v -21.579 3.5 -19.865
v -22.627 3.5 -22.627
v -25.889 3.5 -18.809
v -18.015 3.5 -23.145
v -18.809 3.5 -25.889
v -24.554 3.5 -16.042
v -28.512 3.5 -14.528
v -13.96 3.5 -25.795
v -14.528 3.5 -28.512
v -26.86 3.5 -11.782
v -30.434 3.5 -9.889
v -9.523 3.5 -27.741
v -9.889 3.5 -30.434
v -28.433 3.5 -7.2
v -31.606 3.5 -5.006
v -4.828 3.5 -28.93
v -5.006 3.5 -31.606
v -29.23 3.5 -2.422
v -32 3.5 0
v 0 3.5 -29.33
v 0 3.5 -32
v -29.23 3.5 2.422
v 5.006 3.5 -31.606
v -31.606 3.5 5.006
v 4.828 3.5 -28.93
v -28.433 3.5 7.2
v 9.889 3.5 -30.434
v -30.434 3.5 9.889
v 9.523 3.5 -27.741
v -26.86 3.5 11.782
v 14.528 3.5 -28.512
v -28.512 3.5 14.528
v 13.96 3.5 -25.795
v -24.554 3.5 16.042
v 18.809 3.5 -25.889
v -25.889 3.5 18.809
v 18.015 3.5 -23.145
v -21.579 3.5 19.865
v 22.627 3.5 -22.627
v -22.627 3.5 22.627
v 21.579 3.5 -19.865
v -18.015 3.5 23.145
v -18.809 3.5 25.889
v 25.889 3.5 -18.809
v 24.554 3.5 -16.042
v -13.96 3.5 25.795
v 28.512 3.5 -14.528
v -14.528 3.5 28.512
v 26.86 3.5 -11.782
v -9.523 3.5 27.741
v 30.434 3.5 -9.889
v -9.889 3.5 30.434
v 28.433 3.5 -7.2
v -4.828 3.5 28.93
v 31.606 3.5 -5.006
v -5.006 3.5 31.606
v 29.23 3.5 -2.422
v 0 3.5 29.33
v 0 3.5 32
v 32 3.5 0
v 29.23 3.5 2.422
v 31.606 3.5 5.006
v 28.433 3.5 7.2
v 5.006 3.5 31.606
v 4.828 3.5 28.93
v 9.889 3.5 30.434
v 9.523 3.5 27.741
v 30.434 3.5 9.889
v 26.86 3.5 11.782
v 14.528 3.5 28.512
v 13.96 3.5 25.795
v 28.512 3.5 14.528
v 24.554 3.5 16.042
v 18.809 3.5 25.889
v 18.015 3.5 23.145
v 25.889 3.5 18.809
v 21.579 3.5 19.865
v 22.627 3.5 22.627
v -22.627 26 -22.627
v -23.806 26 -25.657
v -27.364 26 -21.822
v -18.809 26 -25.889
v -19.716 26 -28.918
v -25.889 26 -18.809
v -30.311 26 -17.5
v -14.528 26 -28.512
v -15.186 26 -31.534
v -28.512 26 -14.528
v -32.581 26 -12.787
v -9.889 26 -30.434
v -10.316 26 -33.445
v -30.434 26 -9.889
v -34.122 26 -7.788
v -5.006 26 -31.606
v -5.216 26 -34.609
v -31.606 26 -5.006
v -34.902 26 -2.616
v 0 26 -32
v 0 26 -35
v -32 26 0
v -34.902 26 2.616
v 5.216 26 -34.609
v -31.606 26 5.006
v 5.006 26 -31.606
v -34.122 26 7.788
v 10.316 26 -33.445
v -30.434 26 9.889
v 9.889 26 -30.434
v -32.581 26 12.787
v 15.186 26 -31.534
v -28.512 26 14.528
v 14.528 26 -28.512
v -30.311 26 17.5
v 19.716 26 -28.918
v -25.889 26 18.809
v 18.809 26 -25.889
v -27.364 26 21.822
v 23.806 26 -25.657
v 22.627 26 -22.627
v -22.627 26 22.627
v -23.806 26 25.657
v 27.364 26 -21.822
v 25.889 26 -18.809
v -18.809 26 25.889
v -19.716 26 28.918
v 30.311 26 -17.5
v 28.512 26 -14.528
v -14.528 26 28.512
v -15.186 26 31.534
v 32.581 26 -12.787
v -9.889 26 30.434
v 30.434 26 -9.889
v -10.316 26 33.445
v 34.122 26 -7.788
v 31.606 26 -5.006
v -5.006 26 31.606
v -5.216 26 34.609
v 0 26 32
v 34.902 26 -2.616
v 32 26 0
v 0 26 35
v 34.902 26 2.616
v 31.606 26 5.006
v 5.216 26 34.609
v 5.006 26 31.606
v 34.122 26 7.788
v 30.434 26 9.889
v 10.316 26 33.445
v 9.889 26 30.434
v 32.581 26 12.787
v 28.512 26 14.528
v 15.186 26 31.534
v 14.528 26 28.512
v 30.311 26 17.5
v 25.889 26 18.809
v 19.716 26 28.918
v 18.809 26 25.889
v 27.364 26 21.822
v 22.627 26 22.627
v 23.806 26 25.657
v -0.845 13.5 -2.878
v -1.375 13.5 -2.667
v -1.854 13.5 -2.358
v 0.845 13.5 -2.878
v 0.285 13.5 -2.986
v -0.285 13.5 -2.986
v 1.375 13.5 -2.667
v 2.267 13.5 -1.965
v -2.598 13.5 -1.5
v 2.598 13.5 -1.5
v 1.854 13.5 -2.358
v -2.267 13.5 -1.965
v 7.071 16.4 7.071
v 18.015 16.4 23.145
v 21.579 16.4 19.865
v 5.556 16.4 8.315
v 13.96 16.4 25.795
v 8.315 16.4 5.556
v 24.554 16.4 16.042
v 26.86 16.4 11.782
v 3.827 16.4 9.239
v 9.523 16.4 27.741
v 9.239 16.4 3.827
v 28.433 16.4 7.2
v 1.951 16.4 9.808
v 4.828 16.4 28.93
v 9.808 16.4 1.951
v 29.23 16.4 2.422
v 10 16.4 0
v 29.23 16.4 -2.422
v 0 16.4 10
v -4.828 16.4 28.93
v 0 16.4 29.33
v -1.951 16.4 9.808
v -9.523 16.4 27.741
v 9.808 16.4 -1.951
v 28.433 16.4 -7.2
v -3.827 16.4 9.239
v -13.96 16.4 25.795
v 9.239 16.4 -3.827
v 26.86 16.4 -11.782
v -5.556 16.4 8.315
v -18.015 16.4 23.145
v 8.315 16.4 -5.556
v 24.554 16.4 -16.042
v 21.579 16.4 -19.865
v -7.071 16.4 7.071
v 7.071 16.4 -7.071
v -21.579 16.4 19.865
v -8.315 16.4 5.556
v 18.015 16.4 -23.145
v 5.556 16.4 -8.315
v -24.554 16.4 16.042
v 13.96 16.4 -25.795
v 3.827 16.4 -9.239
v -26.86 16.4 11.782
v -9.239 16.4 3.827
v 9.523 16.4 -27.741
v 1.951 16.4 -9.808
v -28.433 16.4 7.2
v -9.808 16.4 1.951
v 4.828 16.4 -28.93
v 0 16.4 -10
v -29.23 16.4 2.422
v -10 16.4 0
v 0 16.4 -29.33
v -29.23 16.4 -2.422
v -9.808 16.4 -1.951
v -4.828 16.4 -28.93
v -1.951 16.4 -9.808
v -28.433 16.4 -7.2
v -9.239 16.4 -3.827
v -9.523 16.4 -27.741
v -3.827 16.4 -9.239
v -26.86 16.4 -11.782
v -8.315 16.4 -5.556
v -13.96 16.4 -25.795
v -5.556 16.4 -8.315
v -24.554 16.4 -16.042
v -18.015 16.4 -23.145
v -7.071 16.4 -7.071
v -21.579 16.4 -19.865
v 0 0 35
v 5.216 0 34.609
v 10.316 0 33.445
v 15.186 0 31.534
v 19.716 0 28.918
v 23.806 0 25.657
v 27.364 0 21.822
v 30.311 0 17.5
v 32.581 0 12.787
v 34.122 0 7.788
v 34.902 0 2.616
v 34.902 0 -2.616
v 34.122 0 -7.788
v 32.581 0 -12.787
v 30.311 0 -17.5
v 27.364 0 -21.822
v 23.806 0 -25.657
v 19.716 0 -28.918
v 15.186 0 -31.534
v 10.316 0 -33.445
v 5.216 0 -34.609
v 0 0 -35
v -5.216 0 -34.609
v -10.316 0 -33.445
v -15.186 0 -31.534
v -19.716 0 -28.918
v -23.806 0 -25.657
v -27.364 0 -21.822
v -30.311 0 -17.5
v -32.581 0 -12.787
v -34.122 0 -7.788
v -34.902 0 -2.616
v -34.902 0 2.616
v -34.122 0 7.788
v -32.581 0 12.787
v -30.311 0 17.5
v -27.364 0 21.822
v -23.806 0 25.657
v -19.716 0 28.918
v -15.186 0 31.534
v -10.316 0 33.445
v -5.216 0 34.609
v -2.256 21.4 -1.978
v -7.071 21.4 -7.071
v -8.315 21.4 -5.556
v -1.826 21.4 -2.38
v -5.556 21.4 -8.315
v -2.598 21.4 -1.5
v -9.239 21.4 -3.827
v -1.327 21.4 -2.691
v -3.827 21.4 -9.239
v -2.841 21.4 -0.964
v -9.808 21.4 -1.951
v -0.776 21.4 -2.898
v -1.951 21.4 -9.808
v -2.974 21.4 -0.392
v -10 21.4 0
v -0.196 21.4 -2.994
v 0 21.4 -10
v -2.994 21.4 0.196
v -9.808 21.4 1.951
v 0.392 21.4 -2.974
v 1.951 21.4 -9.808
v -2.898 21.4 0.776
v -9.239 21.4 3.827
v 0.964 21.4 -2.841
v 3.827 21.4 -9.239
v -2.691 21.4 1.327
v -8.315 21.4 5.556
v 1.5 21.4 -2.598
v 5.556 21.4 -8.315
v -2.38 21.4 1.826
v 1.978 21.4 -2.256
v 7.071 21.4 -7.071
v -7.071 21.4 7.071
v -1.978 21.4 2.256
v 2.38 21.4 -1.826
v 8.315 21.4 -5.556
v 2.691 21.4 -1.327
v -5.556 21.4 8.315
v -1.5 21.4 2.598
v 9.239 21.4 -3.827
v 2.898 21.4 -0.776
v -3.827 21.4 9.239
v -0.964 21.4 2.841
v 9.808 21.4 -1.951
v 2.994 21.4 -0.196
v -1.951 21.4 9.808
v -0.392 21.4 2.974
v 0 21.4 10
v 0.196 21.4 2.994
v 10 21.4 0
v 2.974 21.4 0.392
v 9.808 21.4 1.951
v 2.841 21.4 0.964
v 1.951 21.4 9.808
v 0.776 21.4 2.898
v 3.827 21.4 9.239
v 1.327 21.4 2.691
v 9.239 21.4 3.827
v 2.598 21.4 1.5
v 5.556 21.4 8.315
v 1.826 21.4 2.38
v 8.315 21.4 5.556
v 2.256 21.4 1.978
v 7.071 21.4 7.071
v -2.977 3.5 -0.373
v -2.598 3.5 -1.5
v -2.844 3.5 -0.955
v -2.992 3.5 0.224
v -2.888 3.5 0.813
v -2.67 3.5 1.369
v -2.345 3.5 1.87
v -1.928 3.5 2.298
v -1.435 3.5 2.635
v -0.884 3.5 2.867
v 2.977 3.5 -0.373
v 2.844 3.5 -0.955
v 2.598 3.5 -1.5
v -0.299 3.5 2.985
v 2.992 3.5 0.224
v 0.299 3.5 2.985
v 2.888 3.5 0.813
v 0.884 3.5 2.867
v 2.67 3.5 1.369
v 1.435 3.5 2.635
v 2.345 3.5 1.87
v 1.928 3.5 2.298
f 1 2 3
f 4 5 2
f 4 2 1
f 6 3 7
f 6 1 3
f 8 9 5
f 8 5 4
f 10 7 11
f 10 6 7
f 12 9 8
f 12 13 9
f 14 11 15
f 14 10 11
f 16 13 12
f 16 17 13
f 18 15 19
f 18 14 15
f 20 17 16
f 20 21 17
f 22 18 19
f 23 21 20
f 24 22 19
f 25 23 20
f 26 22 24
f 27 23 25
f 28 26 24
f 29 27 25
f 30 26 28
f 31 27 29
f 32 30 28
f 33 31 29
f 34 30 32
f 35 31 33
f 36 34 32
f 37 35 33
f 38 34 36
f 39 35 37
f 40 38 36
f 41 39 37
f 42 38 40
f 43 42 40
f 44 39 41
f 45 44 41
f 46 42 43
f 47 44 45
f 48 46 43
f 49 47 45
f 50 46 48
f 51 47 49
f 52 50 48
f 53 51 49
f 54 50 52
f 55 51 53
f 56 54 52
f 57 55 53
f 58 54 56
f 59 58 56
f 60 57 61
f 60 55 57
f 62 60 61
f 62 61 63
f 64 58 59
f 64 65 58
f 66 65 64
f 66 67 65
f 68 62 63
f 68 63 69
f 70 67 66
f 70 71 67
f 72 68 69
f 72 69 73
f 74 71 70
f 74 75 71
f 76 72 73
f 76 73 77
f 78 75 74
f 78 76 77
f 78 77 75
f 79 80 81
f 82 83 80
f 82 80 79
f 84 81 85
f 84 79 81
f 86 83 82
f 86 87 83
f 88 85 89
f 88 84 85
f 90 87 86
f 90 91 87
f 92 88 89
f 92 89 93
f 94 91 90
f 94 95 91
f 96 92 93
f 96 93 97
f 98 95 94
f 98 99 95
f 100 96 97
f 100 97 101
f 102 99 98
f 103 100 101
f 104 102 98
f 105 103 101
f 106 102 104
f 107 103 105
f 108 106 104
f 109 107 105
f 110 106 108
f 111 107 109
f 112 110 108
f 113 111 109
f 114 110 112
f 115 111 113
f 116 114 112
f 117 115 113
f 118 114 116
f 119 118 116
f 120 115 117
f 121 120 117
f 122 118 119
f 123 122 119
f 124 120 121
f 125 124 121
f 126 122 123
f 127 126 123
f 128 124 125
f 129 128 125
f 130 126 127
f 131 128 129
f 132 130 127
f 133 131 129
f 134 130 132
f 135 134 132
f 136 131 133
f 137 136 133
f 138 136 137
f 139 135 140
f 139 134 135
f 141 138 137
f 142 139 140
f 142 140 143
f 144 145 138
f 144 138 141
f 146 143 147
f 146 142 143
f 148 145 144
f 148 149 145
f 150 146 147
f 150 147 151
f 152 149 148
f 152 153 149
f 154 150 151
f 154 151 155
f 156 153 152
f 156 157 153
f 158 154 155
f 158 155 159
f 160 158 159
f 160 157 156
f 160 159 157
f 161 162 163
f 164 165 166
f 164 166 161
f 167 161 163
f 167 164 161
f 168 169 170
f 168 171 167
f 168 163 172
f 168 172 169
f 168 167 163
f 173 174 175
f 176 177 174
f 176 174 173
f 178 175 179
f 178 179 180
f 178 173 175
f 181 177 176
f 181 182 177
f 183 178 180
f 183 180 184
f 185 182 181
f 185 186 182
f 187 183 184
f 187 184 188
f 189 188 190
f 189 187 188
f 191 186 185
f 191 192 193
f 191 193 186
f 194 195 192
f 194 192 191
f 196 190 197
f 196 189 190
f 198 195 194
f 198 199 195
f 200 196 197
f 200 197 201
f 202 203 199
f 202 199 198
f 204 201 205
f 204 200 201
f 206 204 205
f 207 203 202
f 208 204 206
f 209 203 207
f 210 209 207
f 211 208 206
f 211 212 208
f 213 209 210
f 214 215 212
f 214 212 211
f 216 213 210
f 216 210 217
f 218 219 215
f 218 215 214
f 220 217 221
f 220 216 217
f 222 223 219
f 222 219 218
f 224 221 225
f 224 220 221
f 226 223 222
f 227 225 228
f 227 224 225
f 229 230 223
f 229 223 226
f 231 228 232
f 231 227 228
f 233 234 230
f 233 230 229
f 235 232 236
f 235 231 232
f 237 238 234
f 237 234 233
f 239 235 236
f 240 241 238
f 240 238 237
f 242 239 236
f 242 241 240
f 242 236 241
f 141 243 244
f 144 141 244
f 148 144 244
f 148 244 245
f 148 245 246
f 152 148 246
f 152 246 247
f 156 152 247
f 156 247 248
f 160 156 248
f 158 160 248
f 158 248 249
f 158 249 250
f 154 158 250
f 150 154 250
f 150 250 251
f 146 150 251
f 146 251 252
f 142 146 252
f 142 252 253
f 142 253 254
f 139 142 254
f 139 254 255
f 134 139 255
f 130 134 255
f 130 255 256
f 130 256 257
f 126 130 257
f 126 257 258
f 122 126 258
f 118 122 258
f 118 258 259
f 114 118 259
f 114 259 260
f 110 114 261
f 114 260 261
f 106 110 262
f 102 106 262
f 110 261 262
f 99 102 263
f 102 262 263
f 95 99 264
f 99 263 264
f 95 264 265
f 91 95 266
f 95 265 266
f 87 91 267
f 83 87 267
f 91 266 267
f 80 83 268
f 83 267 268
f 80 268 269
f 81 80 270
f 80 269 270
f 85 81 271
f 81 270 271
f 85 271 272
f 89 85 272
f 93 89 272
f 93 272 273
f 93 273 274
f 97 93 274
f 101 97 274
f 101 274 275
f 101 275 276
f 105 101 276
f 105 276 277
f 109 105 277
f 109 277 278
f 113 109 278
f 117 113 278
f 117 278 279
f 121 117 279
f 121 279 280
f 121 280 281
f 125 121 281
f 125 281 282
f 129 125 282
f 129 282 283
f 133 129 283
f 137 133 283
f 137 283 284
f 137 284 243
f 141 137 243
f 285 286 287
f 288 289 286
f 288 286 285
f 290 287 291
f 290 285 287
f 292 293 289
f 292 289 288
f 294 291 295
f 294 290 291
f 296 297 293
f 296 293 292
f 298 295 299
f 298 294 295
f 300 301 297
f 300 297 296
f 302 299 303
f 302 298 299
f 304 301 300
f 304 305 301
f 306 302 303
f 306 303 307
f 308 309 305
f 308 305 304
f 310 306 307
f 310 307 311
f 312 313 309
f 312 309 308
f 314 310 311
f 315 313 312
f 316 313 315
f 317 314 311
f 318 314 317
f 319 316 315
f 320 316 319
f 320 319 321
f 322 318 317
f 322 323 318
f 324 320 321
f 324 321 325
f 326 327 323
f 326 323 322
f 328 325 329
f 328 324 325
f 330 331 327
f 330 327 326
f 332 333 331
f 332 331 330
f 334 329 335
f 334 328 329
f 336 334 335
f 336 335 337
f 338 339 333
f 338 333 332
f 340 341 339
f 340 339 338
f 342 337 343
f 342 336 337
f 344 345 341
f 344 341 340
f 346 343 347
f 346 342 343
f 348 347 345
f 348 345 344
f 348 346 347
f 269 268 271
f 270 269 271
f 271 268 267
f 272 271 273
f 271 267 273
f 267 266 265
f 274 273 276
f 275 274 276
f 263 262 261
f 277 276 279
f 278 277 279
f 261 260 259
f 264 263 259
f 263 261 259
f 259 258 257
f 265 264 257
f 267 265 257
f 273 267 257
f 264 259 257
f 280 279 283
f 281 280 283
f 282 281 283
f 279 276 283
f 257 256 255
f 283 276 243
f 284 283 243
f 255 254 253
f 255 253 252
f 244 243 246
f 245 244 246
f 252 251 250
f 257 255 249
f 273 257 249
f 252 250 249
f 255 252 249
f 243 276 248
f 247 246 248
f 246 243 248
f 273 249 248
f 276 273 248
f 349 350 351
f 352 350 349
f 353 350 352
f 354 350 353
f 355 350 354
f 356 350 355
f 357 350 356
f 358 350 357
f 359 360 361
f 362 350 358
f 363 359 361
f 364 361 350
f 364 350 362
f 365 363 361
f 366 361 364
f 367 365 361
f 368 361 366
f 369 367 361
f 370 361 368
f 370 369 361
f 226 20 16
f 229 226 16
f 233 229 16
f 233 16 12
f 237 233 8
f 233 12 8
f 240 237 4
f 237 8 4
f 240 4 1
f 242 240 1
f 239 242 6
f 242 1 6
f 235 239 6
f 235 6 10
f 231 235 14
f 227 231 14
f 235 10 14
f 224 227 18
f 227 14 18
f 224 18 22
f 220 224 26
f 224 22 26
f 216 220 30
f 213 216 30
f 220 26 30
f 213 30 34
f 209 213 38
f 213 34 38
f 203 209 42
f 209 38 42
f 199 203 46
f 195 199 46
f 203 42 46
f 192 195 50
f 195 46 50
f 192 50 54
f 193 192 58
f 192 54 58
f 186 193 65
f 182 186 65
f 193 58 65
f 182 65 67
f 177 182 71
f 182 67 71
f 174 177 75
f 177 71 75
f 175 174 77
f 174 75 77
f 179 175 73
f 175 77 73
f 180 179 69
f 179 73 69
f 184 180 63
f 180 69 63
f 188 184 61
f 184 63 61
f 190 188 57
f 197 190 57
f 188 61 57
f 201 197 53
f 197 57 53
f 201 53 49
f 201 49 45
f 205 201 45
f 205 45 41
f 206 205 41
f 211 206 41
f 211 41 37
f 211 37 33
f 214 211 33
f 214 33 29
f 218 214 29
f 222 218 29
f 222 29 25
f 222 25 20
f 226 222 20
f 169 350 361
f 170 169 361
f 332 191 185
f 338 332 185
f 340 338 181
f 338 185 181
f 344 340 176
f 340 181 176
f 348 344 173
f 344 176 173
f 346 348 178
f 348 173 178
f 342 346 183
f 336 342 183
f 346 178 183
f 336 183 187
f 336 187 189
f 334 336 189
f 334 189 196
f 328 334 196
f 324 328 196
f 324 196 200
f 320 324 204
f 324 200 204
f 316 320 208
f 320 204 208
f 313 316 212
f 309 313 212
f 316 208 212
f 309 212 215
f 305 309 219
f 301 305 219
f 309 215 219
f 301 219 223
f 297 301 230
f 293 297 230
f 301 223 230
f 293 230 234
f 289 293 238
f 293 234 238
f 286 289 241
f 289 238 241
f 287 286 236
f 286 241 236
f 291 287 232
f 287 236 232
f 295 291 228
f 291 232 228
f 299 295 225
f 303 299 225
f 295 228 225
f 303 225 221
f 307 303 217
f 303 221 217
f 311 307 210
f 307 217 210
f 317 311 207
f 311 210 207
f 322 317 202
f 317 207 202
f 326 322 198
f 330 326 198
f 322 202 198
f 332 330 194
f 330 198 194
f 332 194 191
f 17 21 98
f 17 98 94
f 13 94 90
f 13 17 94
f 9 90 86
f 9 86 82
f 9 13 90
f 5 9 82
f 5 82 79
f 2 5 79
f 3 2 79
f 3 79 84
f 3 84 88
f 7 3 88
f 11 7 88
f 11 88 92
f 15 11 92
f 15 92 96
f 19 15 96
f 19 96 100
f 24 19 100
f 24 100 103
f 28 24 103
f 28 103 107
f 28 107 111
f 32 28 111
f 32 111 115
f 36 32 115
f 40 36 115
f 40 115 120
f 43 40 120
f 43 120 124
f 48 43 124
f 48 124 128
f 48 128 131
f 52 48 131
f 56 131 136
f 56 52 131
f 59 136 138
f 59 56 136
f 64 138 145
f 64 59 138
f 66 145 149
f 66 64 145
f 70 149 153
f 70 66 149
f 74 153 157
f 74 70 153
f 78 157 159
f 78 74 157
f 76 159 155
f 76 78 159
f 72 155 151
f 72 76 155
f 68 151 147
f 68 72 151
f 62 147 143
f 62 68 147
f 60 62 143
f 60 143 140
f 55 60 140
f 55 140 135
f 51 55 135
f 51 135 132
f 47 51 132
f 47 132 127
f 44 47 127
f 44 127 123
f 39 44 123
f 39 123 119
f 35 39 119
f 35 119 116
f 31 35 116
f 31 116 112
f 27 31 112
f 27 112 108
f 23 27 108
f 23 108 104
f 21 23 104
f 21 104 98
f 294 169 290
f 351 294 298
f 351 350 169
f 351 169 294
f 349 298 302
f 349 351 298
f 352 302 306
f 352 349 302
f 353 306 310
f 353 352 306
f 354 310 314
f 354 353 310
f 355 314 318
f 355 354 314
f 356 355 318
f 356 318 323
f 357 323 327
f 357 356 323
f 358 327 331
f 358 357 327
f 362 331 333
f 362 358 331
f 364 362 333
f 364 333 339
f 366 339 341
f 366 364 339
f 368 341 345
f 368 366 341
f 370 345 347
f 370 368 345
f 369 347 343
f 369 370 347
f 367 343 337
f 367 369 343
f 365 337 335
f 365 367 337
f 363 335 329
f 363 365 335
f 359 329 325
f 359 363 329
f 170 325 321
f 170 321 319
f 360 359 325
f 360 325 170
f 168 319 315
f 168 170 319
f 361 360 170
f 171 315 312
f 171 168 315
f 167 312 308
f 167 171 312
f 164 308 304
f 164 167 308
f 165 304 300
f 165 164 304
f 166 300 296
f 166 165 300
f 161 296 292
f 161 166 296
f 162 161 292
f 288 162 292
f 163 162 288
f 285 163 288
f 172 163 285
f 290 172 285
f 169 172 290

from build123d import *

# Parameters (mm, degrees)
VOLUME_KNOB_R                      = 35
KNOB_TOP_DEPTH                     = 3.5
VOLUME_KNOB_3_R                    = 35
VOLUME_KNOB_3_R_2                  = 32
KNOB_WALLS_DEPTH                   = 26
KNOB_START                         = 3.5
KNOB_SHAFT_KEYWAY_DEPTH            = 10
VOLUME_KNOB_8_R                    = 29.33
VOLUME_KNOB_8_R_2                  = 3
KNOB_DAMEPNING_EXTENSION_TOP_DEPTH = 12.9
KNOB_START_2                       = 16.4
VOLUME_KNOB_11_R                   = 10
VOLUME_KNOB_11_R_2                 = 3
KNOB_SHAFT_SUPPORT_DEPTH           = 5


with BuildPart() as part:
    # Volume Knob → Knob Top (new body)
    with BuildSketch(Plane(origin=(0, 0, 0), x_dir=(1, 0, 0), z_dir=(0, 1, 0))):
        with Locations(Location((0, 0, 0), (0, 0, 270))):
            Circle(VOLUME_KNOB_R)
    extrude(amount=KNOB_TOP_DEPTH)

    # Volume Knob<3> → Knob Walls (add)
    with BuildSketch(Plane(origin=(0, 0, 0), x_dir=(1, 0, 0), z_dir=(0, 1, 0))):
        with Locations(Location((0, 0, 0), (0, 0, 270))):
            Circle(VOLUME_KNOB_3_R)
        with Locations(Location((0, 0, 0), (0, 0, 90))):
            Circle(VOLUME_KNOB_3_R_2, mode=Mode.SUBTRACT)
    extrude(amount=KNOB_WALLS_DEPTH)

    # Volume Knob<4> → Knob Shaft Keyway (add)
    with BuildSketch(Plane(origin=(0, 0, 0), x_dir=(1, 0, 0), z_dir=(0, 1, 0)).offset(KNOB_START)):
        with BuildLine():
            Line((-2.598076211, 1.5), (2.598076211, 1.5))
            ThreePointArc((2.598076211, 1.5), (0, 3), (-2.598076211, 1.5))
        make_face()
    extrude(amount=KNOB_SHAFT_KEYWAY_DEPTH)

    # Volume Knob<8> → Knob Damepning Extension (top) (add)
    with BuildSketch(Plane(origin=(0, 0, 0), x_dir=(1, 0, 0), z_dir=(0, 1, 0)).offset(KNOB_START)):
        with Locations(Location((0, 0, 0), (0, 0, 90))):
            Circle(VOLUME_KNOB_8_R)
        with Locations(Location((0, 0, 0), (0, 0, 150))):
            Circle(VOLUME_KNOB_8_R_2, mode=Mode.SUBTRACT)
    extrude(amount=KNOB_DAMEPNING_EXTENSION_TOP_DEPTH)

    # Volume Knob<11> → Knob Shaft Support (add)
    with BuildSketch(Plane(origin=(0, 0, 0), x_dir=(1, 0, 0), z_dir=(0, 1, 0)).offset(KNOB_START_2)):
        with Locations(Location((0, 0, 0), (0, 0, 270))):
            Circle(VOLUME_KNOB_11_R)
        with Locations(Location((0, 0, 0), (0, 0, 150))):
            Circle(VOLUME_KNOB_11_R_2, mode=Mode.SUBTRACT)
    extrude(amount=KNOB_SHAFT_SUPPORT_DEPTH)


solid = part.part
